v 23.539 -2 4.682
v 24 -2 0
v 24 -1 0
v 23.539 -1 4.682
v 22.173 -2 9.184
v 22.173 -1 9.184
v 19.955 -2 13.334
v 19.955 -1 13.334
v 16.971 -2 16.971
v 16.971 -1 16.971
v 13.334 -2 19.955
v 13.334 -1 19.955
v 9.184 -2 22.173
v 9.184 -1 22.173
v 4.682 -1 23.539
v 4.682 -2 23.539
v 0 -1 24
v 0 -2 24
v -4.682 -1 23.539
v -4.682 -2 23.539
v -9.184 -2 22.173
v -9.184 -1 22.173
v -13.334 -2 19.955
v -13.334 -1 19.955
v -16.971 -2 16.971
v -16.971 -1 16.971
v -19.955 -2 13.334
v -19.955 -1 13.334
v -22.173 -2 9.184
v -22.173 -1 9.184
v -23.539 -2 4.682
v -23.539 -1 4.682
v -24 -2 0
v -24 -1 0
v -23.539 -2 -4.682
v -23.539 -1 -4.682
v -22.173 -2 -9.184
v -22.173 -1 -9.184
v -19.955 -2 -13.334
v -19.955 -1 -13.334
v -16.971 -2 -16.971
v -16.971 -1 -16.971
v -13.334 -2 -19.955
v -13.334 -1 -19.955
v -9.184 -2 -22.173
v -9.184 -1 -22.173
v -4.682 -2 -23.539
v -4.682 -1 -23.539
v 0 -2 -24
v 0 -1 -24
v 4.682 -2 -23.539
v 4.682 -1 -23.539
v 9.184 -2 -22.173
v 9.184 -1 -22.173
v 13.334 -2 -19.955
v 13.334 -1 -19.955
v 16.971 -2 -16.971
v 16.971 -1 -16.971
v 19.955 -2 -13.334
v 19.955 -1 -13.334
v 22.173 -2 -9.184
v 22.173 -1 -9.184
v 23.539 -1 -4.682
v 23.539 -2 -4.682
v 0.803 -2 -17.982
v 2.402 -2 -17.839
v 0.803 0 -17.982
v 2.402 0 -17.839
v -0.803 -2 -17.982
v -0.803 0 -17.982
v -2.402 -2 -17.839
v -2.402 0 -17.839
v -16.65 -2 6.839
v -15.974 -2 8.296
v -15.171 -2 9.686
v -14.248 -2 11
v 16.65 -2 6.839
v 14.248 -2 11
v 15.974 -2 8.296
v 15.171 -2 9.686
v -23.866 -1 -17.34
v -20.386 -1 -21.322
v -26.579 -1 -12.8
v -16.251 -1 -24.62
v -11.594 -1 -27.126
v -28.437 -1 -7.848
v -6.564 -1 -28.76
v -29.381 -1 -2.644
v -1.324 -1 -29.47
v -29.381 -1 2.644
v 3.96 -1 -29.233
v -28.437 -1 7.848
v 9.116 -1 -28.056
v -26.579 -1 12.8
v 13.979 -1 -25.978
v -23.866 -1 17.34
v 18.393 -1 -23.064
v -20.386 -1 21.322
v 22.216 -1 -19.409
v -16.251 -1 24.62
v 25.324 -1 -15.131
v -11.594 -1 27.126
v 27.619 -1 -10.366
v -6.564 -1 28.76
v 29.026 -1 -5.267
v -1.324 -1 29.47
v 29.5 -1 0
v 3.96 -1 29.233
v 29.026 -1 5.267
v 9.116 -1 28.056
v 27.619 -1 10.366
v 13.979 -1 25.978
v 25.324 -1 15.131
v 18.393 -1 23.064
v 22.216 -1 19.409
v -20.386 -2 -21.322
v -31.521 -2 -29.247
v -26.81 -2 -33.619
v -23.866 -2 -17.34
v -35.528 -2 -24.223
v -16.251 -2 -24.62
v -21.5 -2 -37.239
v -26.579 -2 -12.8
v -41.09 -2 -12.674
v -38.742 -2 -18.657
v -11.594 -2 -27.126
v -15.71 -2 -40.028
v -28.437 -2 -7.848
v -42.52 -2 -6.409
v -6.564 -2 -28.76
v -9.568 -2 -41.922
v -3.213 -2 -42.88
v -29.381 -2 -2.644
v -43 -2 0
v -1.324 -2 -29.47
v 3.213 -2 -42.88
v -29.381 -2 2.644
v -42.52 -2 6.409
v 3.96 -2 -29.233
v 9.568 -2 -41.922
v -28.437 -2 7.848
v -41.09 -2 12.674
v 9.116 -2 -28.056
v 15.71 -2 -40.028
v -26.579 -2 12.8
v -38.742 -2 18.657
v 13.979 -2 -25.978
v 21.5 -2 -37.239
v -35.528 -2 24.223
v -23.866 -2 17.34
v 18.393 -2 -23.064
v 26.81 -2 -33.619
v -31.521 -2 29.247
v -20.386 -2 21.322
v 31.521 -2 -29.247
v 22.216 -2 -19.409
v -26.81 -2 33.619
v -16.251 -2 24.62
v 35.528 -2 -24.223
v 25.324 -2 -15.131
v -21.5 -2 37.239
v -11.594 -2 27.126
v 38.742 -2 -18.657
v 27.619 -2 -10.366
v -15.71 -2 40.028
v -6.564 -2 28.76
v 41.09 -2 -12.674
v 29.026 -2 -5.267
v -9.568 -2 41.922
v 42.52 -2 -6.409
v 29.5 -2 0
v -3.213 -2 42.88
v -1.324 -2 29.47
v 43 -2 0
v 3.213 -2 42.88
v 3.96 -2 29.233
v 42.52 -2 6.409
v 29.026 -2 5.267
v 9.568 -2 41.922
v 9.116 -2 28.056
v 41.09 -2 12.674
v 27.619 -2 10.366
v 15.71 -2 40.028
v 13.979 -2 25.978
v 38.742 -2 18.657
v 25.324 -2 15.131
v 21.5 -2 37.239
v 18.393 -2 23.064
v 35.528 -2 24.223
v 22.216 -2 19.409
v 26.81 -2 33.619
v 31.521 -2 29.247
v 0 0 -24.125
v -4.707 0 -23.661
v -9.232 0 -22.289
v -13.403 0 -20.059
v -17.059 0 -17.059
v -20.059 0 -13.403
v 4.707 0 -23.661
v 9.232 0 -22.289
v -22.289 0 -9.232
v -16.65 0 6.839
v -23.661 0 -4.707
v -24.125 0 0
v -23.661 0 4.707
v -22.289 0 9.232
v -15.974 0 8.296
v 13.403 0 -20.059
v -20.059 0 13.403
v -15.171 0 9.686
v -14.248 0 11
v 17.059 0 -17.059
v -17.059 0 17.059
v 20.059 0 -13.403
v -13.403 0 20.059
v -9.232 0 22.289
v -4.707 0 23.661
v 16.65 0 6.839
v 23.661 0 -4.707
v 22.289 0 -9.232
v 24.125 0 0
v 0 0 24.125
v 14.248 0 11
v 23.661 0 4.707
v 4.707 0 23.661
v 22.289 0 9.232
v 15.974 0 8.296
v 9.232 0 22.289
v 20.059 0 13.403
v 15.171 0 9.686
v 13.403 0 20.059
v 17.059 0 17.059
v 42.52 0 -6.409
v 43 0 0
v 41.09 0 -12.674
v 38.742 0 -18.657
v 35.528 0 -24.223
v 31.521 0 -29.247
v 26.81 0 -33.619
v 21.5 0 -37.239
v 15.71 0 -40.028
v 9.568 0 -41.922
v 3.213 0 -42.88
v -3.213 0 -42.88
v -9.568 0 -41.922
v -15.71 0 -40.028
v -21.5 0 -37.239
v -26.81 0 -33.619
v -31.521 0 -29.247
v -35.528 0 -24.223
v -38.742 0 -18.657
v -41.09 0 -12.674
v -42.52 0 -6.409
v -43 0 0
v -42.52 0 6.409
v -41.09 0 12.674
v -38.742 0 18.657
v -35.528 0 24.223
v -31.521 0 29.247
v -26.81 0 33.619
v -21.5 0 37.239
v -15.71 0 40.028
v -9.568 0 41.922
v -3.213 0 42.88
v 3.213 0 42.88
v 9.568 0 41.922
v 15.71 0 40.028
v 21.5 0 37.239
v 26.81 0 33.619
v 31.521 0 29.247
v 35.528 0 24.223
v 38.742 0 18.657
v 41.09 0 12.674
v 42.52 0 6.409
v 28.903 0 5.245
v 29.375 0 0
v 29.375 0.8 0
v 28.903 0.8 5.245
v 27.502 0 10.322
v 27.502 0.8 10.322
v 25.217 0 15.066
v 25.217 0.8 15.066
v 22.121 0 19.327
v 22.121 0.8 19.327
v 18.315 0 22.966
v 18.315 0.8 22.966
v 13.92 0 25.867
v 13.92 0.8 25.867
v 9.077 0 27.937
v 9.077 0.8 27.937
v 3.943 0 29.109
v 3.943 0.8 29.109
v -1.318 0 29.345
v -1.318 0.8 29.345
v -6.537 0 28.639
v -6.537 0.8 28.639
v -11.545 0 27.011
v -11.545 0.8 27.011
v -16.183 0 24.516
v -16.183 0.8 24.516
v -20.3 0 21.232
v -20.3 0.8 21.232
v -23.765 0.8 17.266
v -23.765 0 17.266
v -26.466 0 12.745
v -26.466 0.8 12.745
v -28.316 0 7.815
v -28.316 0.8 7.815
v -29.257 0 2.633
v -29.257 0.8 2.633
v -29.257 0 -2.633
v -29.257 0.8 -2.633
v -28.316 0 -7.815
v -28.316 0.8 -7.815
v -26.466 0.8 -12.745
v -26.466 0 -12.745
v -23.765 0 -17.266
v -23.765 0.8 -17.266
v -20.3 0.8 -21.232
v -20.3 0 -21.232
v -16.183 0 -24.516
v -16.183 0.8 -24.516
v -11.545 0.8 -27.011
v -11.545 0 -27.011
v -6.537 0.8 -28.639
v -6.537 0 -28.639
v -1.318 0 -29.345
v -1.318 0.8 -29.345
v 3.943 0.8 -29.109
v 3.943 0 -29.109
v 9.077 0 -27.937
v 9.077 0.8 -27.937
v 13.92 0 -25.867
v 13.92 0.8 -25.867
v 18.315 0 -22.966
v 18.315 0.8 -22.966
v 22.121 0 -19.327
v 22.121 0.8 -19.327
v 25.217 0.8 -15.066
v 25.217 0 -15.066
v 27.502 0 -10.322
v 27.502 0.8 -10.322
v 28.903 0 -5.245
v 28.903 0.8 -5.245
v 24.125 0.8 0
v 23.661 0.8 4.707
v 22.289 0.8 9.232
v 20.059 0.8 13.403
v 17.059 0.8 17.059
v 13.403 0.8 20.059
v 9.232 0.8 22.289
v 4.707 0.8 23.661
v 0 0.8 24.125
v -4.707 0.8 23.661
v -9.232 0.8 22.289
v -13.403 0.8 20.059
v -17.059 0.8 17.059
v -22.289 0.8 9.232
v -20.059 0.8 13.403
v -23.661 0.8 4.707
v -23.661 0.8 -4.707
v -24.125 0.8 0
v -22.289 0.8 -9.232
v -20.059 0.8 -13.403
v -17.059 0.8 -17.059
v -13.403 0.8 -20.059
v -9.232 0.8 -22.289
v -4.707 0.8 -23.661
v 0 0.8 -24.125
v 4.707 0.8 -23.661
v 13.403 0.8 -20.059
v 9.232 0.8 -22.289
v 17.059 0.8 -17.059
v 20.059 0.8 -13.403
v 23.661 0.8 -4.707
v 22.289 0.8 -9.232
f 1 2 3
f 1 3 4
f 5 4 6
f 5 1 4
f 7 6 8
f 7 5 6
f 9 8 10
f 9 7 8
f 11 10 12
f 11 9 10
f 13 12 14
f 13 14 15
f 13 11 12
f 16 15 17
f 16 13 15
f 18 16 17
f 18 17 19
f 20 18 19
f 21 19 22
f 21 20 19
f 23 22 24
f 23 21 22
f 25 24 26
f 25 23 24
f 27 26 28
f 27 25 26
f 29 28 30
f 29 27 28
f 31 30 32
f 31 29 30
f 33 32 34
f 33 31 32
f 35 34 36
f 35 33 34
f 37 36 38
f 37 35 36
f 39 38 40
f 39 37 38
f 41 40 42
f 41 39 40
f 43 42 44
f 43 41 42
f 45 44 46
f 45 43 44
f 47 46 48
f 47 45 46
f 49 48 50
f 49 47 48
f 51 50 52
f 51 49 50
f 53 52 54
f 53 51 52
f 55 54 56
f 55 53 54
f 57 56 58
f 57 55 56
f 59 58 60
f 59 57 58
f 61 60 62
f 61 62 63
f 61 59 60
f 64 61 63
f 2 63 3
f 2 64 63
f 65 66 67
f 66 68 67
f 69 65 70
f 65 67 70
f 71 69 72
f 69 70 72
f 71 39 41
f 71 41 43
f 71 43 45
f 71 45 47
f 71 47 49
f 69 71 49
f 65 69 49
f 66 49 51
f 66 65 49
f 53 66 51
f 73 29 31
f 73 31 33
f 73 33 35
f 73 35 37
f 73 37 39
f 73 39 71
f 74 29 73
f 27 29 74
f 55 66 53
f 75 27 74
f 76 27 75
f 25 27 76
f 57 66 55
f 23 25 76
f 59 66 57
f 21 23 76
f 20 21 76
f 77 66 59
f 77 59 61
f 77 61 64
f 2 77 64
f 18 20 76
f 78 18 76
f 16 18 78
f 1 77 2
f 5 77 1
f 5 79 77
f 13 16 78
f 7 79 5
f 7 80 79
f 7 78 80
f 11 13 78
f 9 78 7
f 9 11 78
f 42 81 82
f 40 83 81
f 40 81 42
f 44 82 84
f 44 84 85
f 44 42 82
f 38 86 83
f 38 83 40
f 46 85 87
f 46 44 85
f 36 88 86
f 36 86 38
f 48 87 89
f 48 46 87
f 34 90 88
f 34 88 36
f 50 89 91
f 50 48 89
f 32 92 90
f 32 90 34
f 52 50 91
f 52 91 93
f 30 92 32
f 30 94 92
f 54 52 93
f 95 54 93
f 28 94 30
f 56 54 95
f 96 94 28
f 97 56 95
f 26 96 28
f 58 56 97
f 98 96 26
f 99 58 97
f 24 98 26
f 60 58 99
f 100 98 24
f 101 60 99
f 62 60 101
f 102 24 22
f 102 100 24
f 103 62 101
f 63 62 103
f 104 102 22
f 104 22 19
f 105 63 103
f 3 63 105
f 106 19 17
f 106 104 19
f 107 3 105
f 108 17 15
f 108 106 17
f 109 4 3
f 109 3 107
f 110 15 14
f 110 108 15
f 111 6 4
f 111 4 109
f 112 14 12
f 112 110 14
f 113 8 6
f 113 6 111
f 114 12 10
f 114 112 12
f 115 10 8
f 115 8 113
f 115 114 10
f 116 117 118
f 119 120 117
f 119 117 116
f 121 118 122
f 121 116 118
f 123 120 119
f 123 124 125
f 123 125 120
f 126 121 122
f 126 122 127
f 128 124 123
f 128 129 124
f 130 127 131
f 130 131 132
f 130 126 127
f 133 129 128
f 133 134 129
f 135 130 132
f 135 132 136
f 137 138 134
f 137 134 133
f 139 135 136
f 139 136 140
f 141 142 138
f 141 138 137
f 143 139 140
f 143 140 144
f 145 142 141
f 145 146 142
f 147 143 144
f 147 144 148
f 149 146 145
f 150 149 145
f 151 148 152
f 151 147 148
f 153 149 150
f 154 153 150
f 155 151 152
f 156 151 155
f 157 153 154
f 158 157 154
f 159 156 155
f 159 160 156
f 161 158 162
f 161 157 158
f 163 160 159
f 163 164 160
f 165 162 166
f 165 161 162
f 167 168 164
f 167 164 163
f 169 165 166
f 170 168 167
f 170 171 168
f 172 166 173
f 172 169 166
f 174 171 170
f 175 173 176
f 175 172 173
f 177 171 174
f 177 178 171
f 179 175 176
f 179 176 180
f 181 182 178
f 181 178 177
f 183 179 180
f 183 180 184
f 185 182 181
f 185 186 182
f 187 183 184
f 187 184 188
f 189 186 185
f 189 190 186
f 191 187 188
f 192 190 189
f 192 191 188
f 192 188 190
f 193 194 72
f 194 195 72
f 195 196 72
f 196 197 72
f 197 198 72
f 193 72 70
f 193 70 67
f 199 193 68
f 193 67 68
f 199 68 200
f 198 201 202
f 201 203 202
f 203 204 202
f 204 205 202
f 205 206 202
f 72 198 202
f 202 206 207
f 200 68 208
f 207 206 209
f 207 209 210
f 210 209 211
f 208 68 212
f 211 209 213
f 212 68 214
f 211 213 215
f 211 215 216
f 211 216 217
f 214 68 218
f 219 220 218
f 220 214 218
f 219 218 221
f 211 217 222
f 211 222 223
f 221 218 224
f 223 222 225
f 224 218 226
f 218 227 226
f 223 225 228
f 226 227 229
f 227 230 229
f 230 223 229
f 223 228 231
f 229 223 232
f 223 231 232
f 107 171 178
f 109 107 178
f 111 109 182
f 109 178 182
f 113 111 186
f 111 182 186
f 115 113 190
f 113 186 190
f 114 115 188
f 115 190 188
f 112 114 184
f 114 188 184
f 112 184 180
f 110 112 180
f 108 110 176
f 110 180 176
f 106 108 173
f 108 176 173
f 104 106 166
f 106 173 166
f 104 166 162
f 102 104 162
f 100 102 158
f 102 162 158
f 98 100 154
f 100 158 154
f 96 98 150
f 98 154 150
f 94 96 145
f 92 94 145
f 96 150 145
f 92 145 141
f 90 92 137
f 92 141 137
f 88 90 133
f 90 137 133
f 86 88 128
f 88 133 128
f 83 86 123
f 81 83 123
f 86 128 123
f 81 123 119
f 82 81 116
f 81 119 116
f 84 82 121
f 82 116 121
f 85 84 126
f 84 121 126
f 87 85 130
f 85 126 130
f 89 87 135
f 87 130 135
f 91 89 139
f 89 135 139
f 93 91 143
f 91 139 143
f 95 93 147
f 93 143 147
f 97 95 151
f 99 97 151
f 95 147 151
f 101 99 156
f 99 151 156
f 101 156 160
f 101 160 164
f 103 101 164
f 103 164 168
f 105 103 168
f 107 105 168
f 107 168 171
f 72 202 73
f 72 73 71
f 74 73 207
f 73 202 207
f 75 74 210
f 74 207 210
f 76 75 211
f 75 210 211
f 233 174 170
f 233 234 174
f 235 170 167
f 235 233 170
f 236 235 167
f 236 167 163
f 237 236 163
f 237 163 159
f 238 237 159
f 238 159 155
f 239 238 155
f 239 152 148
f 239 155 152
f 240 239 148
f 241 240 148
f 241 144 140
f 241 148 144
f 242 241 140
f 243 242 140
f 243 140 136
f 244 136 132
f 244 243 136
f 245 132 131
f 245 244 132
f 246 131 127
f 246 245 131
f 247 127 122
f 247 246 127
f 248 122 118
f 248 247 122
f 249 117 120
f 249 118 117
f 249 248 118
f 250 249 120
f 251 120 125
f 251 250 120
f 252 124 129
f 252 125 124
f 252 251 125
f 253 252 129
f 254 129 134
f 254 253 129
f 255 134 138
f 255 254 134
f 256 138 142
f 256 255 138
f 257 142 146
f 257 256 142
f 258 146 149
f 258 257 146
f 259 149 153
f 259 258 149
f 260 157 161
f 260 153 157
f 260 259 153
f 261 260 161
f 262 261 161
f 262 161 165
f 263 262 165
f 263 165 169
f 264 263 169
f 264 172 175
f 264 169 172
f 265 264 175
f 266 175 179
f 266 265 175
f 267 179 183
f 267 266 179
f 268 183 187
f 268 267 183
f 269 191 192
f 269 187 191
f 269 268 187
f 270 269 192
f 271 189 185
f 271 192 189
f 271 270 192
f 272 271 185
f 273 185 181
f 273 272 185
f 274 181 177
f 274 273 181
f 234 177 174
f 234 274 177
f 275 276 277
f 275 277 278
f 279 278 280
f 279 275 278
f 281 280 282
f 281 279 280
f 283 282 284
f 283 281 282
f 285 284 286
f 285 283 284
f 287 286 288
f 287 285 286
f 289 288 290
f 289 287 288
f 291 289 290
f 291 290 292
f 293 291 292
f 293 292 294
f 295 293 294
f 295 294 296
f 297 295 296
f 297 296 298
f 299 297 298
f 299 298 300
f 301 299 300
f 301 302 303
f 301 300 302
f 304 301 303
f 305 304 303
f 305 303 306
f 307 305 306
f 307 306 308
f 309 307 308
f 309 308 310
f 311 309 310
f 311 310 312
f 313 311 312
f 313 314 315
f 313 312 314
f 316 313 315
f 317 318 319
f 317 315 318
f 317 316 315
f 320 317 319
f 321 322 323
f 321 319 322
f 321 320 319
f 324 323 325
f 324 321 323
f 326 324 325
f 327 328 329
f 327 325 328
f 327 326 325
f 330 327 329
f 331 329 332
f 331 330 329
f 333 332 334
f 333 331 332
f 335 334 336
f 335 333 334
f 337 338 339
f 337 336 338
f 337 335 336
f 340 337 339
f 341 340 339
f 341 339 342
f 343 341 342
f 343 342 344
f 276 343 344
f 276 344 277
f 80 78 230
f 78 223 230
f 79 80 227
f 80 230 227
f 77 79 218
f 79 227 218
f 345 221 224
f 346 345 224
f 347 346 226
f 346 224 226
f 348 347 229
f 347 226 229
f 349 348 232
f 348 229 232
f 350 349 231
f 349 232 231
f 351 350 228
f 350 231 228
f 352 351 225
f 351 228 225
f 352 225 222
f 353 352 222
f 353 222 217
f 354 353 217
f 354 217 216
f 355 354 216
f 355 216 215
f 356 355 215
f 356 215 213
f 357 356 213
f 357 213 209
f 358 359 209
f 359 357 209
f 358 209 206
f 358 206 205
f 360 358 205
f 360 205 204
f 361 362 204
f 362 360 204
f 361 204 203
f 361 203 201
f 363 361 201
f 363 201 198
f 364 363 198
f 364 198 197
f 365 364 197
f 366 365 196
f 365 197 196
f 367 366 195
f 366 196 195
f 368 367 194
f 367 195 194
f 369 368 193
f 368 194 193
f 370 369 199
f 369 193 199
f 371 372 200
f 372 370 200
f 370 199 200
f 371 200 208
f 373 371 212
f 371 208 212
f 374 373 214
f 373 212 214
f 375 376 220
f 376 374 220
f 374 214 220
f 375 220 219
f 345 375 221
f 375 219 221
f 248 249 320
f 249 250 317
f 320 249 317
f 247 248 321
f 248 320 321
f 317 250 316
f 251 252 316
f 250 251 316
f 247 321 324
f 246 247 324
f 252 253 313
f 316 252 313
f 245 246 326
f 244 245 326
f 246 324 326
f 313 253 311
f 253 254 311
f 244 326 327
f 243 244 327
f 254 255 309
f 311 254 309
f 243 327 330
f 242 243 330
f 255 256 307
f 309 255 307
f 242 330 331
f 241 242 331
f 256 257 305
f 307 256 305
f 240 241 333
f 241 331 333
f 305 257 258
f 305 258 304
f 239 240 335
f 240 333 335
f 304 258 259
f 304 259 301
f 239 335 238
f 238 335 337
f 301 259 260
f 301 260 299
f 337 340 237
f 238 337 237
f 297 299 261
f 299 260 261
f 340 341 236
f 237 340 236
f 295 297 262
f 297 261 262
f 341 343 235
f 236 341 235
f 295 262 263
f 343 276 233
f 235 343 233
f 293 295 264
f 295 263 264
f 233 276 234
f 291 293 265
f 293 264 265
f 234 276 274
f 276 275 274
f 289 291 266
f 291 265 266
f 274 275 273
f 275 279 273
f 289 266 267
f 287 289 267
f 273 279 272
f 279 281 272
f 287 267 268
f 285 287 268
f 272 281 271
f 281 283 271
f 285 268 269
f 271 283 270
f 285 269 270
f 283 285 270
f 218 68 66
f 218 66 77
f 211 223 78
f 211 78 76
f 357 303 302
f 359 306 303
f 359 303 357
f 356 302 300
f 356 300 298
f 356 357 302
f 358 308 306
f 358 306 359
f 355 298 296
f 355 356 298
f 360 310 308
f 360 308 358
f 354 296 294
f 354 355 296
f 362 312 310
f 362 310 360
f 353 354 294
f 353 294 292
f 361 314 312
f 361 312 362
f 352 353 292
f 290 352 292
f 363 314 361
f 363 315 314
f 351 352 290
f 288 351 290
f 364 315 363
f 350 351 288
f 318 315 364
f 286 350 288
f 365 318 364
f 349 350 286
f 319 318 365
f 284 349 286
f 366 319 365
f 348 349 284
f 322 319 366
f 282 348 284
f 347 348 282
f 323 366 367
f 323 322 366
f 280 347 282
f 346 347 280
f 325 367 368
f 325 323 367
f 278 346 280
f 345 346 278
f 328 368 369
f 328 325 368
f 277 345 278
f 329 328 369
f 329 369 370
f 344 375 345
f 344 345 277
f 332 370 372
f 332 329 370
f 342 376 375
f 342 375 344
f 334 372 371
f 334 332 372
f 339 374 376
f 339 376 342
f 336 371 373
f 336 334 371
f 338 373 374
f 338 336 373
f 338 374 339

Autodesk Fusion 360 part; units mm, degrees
sketch "草图1" plane through (0, 0, 0) normal (0, 1, 0) x (1, 0, 0)
  circle A0 centre (0, 0) radius 24.125
  circle A1 centre (0, 0) radius 29.375
  dimension "d1" = 48.25
  dimension "d2" = 58.75
extrude "拉伸1" add sketch "草图1" along normal blind 0.8 makes body 1
sketch "草图2" plane through (0, 0, 0) normal (0, -1, 0) x (1, 0, 0)
  circle A0 centre (0, 0) radius 24.125
  circle A1 centre (0, 0) radius 29.375
  circle A2 centre (0, 0) radius 43
  line L0 (2.4024, -17.839) -> (16.6502, 6.839)
  line L1 (-16.6502, 6.839) -> (-2.4024, -17.839)
  arc A3 (-14.2478, 11) -> (-16.6502, 6.839) centre (0, 0) ccw
  line L2 (14.2478, 11) -> (-14.2478, 11)
  arc A4 (16.6502, 6.839) -> (14.2478, 11) centre (0, 0) ccw
  arc A5 (-2.4024, -17.839) -> (2.4024, -17.839) centre (0, 0) ccw
  dimension "d5" = 86
extrude "拉伸2" add sketch "草图2" along normal blind 2 separate body contours A2 makes body 2
extrude "拉伸3" add sketch "草图2" along normal blind 1 contours A0 | A1 bodies 1 2
extrude "拉伸4" add 1 faces at (-15.1728, -1, -7.9151) along direction (0, -1, 0) up to surface (1 mm away) on bodies 1 bodies 1
sketch "草图3" plane through (0, -2, 0) normal (0, -1, 0) x (1, 0, 0)
  line L0 (16.6502, 6.839) -> (2.4024, -17.839)
  arc A0 (-2.4024, -17.839) -> (2.4024, -17.839) centre (0, 0) ccw
  line L1 (-2.4024, -17.839) -> (-16.6502, 6.839)
  arc A1 (-14.2478, 11) -> (-16.6502, 6.839) centre (0, 0) ccw
  line L2 (-14.2478, 11) -> (14.2478, 11)
  arc A2 (16.6502, 6.839) -> (14.2478, 11) centre (0, 0) ccw
  circle A3 centre (0, 0) radius 43
  circle A4 centre (0, 0) radius 29.5
  circle A5 centre (0, 0) radius 24
  dimension "d12" = 59
  dimension "d13" = 48
extrude "拉伸5" cut sketch "草图3" against normal blind 1 contours A4 bodies 1
